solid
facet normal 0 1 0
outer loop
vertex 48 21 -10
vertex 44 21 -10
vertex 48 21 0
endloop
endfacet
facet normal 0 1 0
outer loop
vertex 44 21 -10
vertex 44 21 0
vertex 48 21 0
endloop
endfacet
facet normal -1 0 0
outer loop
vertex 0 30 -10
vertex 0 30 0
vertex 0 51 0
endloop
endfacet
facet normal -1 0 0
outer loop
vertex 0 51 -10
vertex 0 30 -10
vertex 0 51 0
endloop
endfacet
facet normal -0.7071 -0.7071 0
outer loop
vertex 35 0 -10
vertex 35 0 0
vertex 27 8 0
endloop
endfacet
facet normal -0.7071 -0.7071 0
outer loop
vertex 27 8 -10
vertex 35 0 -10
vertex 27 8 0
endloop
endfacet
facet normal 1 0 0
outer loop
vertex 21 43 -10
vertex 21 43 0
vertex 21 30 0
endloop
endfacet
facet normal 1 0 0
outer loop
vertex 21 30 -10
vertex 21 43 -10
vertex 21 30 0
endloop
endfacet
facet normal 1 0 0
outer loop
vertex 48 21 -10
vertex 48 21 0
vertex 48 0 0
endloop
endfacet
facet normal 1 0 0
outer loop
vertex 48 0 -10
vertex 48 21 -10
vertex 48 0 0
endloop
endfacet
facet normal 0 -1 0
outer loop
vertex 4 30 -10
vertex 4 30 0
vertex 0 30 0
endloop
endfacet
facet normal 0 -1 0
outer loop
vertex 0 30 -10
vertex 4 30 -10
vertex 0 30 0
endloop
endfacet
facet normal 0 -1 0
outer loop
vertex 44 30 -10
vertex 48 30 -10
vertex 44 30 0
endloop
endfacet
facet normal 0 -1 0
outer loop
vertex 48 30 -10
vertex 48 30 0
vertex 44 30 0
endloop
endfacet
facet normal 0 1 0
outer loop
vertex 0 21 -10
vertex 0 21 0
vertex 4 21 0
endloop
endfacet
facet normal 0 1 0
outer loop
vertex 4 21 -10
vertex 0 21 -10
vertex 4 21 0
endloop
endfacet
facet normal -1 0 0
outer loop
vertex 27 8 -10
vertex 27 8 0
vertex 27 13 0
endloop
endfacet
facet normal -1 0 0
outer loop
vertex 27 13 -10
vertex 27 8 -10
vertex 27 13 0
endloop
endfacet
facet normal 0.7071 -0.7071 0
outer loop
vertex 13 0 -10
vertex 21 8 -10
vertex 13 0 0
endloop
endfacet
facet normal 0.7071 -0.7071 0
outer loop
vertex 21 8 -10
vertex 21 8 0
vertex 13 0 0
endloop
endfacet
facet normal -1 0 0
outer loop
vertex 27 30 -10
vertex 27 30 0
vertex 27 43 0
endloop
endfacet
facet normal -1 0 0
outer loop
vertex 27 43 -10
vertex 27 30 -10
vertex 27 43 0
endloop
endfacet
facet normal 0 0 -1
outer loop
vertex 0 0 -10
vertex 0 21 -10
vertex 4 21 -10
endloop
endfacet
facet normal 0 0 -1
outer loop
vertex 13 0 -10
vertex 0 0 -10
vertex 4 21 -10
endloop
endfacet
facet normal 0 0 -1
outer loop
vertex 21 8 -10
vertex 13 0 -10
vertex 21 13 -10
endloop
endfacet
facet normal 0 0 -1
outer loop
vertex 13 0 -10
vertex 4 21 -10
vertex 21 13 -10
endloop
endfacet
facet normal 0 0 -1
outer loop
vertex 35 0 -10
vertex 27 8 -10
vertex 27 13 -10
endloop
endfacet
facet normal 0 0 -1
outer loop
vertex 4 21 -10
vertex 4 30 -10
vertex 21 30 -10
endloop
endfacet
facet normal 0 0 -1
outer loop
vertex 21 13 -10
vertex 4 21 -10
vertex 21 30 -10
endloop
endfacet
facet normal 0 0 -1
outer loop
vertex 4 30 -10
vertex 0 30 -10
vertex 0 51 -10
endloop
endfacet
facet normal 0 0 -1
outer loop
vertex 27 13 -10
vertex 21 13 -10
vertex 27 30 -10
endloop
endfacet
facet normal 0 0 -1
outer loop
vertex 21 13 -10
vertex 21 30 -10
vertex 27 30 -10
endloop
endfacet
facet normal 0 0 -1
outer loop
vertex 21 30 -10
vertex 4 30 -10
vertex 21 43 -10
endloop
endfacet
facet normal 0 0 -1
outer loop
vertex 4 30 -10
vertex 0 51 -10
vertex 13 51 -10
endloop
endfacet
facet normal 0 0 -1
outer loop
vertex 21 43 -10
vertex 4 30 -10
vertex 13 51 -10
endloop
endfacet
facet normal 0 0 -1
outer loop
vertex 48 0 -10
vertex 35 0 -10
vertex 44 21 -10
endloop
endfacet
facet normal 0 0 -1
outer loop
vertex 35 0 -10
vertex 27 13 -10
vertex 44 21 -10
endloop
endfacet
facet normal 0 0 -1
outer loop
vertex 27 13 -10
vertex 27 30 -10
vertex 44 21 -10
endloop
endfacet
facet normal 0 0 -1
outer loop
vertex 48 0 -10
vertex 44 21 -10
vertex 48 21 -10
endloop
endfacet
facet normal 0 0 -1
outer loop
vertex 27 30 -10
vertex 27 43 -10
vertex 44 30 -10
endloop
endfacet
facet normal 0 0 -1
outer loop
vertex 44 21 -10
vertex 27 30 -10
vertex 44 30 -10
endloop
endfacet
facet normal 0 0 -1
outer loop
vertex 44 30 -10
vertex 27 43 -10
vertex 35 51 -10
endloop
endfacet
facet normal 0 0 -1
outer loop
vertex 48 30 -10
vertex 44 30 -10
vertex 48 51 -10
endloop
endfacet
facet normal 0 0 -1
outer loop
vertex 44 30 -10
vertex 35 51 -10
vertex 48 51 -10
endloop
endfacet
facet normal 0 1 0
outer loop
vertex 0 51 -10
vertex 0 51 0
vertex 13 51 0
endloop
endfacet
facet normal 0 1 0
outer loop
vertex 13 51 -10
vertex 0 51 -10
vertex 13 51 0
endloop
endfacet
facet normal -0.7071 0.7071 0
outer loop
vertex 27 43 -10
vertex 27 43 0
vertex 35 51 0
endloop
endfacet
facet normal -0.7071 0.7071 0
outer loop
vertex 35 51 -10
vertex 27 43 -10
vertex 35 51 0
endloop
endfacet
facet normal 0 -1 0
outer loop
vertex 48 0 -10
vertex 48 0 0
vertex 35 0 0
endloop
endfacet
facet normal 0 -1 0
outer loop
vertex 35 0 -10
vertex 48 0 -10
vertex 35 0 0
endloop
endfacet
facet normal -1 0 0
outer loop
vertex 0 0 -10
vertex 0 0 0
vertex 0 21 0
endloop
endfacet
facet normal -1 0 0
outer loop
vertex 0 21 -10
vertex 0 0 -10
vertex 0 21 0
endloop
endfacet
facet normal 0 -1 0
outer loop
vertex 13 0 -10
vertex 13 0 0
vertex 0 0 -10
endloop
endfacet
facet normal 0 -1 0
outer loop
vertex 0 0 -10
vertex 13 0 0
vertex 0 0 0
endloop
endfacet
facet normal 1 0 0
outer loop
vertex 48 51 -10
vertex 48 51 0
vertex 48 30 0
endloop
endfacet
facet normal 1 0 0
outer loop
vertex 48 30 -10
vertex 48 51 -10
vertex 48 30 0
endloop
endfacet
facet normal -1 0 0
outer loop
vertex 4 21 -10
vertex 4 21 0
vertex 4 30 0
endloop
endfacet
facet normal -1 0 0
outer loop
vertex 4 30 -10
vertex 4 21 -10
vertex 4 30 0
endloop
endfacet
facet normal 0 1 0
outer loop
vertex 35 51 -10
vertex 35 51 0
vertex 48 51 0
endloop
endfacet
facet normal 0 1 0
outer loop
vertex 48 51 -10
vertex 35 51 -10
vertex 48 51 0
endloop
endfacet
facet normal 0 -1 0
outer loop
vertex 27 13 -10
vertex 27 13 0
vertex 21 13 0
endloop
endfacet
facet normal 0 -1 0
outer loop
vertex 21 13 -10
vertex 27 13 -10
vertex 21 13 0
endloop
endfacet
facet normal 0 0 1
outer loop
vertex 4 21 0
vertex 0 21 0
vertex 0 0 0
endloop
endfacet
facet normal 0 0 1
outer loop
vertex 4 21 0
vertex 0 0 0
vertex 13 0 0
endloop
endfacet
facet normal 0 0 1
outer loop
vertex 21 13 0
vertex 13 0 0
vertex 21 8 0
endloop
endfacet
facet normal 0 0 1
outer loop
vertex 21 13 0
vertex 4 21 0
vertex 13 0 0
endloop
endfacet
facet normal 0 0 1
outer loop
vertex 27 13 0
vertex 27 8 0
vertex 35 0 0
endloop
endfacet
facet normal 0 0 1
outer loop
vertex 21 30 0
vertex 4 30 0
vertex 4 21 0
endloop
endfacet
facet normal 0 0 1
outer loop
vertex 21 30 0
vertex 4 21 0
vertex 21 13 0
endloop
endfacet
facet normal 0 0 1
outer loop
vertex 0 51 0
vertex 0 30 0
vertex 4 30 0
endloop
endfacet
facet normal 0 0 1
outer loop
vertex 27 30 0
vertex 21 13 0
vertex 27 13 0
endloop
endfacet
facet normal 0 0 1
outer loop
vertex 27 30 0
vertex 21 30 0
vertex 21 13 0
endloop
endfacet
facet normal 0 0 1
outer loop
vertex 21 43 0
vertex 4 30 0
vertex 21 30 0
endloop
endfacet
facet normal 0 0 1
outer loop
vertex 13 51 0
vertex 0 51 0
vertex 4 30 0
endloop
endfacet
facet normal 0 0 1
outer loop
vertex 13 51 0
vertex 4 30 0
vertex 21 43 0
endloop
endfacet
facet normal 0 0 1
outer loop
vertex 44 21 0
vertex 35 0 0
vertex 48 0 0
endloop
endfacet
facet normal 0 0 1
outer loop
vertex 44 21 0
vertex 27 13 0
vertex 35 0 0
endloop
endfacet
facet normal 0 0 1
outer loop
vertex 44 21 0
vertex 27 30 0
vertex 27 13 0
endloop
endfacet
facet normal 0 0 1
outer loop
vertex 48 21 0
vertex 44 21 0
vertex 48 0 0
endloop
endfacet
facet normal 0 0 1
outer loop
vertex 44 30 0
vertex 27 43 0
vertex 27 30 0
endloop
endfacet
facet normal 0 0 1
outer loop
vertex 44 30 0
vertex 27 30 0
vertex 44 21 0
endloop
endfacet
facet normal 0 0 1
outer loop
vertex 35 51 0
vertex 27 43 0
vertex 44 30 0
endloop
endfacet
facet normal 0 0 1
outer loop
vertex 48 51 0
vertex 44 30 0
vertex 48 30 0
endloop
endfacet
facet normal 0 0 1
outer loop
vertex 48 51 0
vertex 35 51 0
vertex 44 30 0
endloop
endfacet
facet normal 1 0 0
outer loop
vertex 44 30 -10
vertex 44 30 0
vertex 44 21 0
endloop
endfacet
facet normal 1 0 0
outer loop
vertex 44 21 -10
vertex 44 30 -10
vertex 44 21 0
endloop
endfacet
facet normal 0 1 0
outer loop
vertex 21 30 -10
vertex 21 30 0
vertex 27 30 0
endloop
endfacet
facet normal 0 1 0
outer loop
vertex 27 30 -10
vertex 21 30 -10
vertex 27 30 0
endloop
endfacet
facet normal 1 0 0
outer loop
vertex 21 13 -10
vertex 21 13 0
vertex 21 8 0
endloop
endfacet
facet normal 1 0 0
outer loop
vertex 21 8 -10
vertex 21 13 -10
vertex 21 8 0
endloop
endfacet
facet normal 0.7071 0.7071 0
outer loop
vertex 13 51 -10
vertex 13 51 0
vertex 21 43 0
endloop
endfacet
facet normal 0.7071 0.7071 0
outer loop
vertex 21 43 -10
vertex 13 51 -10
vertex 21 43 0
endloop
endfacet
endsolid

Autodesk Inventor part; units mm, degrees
ref_plane "YZ Plane" through (0, 0, 0) normal (1, 0, 0) x (0, 1, 0)
ref_plane "XZ Plane" through (0, 0, 0) normal (0, 1, 0) x (-1, 0, 0)
ref_plane "XY Plane" through (0, 0, 0) normal (0, 0, 1) x (1, 0, 0)
sketch "Skizze1" plane through (0, 0, 0) normal (0, 0, 1) x (1, 0, 0)
  line L0 (13, 0) -> (0, 0)
  line L1 (0, 0) -> (0, 21)
  line L2 (0, 21) -> (4, 21)
  line L3 (4, 21) -> (4, 30)
  line L4 (4, 30) -> (0, 30)
  line L5 (0, 30) -> (0, 51)
  line L6 (0, 51) -> (13, 51)
  line L7 (13, 51) -> (21, 43)
  line L8 (21, 43) -> (21, 30)
  line L9 (21, 30) -> (27, 30)
  line L10 (27, 30) -> (27, 43)
  line L11 (27, 43) -> (35, 51)
  line L12 (35, 51) -> (48, 51)
  line L13 (48, 51) -> (48, 30)
  line L14 (48, 30) -> (44, 30)
  line L15 (44, 30) -> (44, 21)
  line L16 (44, 21) -> (48, 21)
  line L17 (48, 21) -> (48, 0)
  line L18 (48, 0) -> (35, 0)
  line L19 (35, 0) -> (27, 8)
  line L20 (27, 8) -> (27, 13)
  line L21 (27, 13) -> (21, 13)
  line L22 (21, 13) -> (21, 8)
  line L23 (21, 8) -> (13, 0)
  point P0 (48, 40.5)
  point P1 (41.5, 51)
  dimension "d0" = 21
  dimension "d1" = 9
  dimension "d2" = 21
  dimension "d3" = 21
  dimension "d4" = 21
  dimension "d5" = 4
  dimension "d6" = 4
  dimension "d7" = 13
  dimension "d8" = 22
  dimension "d9" = 13
  dimension "d10" = 21
  dimension "d11" = 135
  dimension "d12" = 135
  dimension "d13" = 45
  dimension "d14" = 45
extrude "Extrusion1" add sketch "Skizze1" against normal blind 10
equation "\"d2\" = d0"
equation "\"d4\" = d3"
equation "\"d6\" = d5"
equation "\"d10\" = d0"
equation "\"d14\" = d13"
properties part number "Vblock"
